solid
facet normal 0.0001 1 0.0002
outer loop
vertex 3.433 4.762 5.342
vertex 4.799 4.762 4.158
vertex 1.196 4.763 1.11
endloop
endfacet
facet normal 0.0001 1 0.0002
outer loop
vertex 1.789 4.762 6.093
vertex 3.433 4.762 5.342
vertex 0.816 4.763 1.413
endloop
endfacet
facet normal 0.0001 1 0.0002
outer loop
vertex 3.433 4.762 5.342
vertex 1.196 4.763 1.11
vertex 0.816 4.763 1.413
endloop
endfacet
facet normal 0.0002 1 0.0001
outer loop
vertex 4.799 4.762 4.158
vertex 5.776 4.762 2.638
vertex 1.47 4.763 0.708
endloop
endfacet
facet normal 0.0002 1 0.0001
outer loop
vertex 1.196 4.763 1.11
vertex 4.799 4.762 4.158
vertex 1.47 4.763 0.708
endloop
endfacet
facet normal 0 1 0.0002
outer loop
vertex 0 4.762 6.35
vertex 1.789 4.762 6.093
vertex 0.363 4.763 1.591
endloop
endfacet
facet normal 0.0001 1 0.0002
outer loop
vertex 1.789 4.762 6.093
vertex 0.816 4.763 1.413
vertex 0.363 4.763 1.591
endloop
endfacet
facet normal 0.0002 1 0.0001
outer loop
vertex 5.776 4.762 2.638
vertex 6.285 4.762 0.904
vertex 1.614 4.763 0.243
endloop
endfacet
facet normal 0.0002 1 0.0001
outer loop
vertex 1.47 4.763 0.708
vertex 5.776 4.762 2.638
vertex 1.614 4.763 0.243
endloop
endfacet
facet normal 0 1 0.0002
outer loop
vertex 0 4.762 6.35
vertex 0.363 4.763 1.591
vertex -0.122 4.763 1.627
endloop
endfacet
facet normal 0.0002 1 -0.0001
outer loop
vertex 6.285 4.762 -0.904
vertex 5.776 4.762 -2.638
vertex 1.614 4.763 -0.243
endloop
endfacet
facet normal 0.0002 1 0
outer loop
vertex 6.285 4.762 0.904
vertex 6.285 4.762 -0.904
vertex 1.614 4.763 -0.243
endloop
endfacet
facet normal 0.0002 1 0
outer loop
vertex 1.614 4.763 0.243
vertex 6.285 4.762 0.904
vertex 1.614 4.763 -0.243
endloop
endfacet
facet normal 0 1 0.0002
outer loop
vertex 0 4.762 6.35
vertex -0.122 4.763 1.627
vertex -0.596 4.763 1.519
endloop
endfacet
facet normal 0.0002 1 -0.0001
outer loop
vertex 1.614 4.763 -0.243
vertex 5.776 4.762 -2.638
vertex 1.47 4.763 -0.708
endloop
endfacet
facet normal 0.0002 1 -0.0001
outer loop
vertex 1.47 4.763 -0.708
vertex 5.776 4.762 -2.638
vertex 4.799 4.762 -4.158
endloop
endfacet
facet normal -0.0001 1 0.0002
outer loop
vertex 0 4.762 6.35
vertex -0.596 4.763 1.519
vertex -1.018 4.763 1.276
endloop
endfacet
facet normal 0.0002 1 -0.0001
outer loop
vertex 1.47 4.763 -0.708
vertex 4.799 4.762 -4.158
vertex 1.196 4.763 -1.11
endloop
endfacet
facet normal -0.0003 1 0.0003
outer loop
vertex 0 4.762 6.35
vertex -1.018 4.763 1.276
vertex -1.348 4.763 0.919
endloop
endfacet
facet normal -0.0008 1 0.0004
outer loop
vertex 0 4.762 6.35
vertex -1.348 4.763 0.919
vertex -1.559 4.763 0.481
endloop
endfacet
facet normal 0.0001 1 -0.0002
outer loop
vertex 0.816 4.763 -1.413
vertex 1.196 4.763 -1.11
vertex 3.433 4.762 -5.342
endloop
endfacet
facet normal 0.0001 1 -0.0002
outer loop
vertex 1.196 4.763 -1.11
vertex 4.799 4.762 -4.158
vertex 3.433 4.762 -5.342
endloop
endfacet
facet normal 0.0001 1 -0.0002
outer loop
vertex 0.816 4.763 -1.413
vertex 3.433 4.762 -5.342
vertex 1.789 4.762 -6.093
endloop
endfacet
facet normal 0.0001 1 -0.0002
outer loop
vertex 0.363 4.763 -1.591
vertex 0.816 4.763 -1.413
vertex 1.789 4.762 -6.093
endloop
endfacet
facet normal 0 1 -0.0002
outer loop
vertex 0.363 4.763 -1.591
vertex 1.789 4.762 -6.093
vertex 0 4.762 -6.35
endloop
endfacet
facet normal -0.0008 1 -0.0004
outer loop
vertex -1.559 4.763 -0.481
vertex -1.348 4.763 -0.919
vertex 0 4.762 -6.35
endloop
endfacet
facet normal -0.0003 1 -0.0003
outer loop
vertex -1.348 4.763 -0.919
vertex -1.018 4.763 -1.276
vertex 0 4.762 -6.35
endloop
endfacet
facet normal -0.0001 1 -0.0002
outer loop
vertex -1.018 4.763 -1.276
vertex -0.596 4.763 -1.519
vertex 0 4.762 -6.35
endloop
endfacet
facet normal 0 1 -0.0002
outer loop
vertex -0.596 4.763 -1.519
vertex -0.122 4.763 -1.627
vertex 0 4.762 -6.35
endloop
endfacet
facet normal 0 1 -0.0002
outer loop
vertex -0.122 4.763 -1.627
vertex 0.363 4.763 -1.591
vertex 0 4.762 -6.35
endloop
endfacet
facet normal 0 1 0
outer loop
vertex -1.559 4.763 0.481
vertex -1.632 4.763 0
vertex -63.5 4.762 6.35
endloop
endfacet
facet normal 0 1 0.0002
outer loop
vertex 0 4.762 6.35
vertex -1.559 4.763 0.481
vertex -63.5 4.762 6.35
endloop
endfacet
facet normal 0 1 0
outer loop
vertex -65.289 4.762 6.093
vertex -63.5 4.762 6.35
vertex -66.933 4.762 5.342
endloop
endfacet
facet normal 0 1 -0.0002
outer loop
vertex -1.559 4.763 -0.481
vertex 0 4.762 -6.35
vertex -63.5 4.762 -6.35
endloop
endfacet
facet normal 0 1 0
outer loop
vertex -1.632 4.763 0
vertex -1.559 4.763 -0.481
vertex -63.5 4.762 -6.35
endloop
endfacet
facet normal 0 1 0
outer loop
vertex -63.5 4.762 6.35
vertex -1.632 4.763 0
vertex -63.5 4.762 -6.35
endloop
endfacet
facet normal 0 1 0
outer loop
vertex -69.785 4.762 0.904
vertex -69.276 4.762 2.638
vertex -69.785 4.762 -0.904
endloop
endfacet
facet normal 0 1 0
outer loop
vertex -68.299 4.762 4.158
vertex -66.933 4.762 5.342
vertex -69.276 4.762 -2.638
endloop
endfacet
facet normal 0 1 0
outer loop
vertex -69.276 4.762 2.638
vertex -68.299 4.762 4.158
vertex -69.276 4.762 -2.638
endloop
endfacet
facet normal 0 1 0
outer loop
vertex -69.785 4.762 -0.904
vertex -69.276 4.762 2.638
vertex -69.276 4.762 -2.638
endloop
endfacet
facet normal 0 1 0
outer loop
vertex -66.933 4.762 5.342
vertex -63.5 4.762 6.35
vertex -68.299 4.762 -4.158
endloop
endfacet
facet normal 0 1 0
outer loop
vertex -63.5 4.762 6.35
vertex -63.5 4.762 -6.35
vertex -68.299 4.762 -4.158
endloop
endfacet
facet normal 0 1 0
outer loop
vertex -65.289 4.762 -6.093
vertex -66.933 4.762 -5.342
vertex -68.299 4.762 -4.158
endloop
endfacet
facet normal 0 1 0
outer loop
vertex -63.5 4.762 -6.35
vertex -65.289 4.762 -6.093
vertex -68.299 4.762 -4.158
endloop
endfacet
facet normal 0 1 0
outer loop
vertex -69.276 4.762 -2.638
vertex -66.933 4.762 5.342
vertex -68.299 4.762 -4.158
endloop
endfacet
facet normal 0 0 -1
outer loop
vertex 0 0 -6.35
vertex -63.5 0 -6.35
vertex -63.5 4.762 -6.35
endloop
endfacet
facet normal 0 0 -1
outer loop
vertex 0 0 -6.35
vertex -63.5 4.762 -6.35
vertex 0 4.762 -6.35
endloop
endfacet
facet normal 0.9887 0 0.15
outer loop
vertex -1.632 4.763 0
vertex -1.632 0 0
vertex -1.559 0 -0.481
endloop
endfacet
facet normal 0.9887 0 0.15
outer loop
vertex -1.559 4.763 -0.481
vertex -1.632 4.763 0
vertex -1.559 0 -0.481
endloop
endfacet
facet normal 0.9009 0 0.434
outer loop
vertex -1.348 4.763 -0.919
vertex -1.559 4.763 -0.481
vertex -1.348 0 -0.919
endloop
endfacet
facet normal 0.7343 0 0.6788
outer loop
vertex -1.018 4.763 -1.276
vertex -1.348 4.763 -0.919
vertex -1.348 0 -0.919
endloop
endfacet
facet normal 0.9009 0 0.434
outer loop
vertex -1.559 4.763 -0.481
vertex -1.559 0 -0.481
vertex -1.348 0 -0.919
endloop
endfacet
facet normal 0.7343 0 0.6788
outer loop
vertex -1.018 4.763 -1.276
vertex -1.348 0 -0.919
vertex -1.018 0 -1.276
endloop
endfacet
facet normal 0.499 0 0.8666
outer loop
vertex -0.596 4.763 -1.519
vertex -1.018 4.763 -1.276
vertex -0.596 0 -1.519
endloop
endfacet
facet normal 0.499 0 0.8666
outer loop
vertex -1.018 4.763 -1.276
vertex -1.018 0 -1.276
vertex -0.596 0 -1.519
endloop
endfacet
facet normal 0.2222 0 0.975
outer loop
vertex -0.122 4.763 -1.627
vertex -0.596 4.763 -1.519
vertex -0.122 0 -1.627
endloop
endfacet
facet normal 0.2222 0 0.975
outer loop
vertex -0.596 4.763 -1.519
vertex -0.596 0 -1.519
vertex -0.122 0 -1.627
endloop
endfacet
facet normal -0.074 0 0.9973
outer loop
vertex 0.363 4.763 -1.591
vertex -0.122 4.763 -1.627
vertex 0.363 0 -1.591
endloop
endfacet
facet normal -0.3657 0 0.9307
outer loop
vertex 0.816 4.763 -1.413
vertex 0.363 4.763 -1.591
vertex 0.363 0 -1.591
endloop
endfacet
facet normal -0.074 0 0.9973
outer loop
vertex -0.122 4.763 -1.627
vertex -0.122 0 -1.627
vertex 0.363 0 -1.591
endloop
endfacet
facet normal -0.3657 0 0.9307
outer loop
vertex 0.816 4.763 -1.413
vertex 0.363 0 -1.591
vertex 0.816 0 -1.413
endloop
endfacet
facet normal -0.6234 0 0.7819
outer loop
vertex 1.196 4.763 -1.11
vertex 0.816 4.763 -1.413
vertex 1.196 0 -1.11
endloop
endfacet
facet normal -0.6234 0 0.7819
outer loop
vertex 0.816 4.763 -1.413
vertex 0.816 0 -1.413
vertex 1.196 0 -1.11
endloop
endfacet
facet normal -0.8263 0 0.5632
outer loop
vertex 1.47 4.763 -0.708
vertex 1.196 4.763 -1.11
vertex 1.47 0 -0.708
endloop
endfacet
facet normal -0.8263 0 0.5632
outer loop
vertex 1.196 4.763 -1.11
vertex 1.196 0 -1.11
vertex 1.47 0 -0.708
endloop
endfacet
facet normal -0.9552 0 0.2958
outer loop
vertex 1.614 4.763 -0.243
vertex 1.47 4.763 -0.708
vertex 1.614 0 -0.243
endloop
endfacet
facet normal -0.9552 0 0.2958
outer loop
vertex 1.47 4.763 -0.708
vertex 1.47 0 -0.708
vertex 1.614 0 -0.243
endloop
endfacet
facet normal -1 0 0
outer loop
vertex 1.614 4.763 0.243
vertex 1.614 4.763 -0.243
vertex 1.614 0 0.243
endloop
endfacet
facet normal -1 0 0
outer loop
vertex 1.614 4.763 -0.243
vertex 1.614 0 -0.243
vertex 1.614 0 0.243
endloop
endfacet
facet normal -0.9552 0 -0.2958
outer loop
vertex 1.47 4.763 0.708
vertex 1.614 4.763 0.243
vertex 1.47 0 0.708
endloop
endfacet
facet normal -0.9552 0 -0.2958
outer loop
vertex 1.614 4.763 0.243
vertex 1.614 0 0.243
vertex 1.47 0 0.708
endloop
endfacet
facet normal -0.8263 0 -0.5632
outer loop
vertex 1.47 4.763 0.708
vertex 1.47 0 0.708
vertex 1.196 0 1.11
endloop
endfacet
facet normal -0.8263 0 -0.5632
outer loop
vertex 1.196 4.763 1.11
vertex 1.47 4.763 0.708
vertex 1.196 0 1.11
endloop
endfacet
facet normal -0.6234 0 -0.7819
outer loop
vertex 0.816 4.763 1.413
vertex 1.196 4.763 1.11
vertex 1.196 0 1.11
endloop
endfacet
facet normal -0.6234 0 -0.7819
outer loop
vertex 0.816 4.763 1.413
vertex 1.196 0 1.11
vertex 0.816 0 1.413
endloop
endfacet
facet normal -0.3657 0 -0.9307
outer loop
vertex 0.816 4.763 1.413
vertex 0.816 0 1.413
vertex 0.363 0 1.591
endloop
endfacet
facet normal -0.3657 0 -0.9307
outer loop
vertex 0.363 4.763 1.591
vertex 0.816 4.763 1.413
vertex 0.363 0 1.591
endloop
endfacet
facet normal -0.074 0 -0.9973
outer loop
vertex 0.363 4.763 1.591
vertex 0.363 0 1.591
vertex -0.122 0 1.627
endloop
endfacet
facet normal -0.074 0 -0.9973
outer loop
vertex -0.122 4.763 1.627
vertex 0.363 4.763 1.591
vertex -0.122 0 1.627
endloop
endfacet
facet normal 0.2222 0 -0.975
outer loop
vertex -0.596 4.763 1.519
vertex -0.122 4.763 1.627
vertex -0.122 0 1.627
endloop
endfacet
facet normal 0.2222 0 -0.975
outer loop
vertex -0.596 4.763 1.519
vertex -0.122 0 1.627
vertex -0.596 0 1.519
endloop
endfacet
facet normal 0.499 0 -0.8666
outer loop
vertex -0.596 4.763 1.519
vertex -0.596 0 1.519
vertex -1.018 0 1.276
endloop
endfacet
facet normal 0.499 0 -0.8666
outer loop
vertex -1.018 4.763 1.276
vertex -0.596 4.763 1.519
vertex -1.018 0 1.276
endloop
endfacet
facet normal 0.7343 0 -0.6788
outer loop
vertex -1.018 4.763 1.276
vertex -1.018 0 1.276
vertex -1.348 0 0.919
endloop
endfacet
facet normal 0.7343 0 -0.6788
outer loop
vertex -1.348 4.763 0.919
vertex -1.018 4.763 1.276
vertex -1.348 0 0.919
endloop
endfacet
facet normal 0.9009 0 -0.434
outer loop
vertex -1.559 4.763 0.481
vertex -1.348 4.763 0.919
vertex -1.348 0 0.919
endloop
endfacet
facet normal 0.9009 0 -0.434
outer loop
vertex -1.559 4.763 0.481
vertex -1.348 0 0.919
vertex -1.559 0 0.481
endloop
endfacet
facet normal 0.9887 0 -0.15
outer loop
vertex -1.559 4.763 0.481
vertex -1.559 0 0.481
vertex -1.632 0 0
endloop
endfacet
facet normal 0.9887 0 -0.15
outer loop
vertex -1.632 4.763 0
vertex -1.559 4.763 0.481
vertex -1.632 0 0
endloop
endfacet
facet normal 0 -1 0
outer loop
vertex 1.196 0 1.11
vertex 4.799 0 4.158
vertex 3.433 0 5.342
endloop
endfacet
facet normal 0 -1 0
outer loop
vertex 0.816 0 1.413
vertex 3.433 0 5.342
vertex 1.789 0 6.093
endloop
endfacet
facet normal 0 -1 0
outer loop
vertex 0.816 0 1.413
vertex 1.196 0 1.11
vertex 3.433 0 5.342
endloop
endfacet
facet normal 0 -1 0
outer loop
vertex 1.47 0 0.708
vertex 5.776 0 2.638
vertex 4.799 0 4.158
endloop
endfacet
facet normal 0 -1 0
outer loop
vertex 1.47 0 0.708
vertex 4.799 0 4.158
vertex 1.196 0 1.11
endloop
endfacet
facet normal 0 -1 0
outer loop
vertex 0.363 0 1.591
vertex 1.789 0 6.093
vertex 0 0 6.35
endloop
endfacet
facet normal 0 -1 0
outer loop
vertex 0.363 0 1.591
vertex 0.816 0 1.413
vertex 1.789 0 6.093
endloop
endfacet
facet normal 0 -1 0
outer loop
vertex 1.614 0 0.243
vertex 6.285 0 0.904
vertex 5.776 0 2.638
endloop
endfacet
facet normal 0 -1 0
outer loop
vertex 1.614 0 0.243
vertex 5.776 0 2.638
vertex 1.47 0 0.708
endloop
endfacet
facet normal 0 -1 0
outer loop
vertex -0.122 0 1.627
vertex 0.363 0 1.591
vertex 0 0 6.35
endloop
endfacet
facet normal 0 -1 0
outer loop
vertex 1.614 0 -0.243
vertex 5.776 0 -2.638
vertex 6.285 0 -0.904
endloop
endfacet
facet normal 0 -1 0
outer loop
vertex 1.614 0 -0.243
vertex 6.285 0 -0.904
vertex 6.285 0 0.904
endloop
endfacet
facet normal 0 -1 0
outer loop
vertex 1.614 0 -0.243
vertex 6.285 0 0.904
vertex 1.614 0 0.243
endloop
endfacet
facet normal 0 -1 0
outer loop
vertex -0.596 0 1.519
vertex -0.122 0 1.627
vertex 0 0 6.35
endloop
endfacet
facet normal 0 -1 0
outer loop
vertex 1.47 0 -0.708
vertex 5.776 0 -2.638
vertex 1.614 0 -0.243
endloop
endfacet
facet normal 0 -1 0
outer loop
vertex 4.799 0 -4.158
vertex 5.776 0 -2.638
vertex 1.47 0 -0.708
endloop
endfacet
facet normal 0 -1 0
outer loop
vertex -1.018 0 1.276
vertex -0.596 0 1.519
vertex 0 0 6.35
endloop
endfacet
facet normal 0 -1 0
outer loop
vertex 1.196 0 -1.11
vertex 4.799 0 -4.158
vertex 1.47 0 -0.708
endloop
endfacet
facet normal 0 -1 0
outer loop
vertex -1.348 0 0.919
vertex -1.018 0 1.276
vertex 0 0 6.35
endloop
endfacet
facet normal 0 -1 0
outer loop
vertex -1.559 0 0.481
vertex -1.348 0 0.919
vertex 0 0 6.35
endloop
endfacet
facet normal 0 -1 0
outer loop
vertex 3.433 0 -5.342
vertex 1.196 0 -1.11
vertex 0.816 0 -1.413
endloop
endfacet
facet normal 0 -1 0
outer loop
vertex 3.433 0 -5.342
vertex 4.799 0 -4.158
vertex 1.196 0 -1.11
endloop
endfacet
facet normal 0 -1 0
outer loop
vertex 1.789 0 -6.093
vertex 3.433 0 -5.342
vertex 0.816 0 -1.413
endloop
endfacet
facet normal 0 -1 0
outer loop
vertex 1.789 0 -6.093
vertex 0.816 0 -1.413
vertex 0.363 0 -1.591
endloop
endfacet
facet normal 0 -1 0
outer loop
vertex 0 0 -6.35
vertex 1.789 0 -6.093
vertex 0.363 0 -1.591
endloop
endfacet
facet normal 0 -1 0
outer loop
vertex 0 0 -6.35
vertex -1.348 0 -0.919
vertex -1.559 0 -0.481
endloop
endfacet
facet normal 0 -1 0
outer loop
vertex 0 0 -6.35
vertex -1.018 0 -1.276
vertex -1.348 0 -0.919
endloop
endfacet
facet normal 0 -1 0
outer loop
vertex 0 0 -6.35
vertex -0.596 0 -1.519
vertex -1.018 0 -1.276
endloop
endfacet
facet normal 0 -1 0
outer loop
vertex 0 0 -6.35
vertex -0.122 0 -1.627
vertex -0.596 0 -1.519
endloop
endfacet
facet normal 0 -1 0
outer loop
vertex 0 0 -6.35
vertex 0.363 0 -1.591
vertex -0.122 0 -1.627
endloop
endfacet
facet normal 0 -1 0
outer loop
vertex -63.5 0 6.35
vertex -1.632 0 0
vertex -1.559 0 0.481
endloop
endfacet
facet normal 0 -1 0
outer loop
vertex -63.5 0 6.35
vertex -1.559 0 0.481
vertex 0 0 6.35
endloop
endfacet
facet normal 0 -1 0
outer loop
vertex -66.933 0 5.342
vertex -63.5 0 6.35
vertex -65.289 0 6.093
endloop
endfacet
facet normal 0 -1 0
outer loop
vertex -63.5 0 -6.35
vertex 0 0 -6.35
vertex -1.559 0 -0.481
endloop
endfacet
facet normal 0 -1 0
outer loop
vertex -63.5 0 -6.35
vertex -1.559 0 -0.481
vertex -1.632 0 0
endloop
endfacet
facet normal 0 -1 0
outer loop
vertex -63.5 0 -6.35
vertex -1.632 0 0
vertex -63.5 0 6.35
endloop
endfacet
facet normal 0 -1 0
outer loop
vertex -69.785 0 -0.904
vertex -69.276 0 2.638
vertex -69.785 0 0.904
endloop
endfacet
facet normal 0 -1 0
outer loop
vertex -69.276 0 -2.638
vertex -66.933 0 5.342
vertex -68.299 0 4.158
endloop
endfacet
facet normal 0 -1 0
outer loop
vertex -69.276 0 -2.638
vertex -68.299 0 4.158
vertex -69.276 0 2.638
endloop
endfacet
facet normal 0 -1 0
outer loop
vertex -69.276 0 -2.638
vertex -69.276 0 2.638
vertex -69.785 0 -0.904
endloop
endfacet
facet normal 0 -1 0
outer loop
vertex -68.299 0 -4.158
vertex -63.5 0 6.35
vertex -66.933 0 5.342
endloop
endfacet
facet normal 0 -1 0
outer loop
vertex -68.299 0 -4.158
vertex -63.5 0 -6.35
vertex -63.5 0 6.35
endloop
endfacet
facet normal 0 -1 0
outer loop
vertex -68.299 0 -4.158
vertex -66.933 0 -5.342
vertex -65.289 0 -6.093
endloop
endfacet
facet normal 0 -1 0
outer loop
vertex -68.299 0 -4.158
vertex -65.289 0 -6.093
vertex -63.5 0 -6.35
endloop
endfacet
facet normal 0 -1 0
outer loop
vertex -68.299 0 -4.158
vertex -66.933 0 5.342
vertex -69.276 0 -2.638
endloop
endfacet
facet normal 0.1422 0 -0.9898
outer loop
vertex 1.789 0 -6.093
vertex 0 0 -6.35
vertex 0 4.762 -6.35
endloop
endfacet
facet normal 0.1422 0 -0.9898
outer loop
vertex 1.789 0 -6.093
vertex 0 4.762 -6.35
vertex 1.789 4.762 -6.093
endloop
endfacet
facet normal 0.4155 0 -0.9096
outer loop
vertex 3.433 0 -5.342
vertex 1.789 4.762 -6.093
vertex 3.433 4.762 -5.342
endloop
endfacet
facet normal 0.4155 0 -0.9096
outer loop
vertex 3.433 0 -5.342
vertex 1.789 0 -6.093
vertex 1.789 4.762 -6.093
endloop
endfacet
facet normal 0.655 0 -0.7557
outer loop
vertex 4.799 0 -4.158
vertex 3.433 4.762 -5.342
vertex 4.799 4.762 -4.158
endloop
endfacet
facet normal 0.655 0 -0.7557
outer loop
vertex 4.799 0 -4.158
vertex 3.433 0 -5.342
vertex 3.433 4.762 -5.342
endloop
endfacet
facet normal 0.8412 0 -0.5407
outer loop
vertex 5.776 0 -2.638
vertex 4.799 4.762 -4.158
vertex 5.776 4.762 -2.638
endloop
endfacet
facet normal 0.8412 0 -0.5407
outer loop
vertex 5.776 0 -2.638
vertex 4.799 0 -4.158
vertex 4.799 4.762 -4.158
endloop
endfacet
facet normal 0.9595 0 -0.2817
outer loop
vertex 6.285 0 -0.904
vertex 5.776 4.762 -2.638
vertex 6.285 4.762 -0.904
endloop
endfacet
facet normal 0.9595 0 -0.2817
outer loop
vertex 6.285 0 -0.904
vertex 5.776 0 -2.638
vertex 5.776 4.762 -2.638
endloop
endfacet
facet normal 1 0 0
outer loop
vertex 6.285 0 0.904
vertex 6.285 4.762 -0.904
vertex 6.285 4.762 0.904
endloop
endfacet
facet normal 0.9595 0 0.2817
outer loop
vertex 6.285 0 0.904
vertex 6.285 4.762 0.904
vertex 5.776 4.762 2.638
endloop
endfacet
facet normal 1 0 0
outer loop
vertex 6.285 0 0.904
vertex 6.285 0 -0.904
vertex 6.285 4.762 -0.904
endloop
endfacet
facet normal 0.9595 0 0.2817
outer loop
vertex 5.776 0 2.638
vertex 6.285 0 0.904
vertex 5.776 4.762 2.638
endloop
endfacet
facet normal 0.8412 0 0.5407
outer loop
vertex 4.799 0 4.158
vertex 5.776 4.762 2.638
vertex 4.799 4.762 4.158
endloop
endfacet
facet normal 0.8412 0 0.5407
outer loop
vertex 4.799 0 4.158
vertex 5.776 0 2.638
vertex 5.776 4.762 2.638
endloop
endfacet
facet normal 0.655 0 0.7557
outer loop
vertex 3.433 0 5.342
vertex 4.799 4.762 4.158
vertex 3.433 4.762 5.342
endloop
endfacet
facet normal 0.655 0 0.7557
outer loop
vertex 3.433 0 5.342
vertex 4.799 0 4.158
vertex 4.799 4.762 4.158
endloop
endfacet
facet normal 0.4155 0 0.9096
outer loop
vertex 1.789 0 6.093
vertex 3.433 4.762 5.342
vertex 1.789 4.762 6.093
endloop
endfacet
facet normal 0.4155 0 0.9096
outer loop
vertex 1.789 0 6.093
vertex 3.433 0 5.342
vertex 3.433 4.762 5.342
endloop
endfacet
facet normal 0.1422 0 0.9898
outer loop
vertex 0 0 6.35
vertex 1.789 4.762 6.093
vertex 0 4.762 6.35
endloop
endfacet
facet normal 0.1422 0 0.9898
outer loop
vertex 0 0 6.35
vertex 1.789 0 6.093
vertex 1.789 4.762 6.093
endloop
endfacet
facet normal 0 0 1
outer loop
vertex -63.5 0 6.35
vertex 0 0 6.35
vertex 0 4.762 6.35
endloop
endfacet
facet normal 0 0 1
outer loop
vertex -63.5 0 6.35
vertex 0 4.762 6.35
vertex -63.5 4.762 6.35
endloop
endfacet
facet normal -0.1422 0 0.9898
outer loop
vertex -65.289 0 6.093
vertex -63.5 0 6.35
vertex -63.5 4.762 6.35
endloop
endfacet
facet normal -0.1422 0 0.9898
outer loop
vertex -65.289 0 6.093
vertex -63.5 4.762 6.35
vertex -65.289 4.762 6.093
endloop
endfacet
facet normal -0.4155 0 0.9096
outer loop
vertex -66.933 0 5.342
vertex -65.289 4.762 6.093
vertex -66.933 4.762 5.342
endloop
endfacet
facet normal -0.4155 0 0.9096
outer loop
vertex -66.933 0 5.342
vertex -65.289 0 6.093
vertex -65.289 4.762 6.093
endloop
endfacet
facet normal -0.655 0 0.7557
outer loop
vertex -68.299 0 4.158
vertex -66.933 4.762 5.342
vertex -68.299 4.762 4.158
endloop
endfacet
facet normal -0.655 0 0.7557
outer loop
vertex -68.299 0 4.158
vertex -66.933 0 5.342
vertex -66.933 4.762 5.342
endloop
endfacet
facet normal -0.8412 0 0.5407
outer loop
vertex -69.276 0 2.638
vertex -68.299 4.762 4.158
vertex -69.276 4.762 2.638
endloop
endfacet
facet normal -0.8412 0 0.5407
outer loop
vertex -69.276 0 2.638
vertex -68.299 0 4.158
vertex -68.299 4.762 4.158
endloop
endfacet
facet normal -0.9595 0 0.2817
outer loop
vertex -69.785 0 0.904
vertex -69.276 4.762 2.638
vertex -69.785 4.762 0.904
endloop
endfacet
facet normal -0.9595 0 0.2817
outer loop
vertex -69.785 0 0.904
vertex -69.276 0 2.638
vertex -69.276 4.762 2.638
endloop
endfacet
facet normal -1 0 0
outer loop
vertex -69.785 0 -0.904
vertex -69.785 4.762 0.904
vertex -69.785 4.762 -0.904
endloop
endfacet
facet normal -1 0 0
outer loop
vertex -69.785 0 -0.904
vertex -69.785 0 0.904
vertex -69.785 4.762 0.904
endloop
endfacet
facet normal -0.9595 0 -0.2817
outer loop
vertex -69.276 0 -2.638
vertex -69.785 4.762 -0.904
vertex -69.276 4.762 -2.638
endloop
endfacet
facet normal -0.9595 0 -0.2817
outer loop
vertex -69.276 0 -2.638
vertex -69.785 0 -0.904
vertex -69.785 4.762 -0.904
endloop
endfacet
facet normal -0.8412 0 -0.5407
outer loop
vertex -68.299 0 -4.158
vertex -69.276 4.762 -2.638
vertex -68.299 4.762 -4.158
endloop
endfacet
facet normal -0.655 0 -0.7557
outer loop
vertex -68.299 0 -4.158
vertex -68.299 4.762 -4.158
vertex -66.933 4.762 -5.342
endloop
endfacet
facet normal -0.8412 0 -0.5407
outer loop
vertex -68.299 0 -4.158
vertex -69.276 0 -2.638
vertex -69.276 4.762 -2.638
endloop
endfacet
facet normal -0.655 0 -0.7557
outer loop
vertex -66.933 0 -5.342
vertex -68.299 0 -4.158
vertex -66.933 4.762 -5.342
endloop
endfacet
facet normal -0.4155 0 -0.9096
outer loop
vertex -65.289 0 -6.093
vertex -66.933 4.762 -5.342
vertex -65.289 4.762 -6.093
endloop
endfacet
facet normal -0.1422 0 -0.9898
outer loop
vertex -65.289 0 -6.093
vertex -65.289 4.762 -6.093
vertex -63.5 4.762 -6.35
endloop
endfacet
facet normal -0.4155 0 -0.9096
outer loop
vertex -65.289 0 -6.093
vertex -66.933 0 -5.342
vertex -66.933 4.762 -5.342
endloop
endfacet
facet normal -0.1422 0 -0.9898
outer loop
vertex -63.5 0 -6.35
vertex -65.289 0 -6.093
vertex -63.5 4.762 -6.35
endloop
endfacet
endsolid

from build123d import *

# Parameters (mm, degrees)
BOSS_EXTRUDE2_DEPTH   = 4.7625
F_4_CLEARANCE_HOLE1_D = 3.2639


with BuildPart() as part:
    # Sketch1 → Boss-Extrude2 (new body)
    with BuildSketch(Plane(origin=(0, 0, 0), x_dir=(1, 0, 0), z_dir=(0, 1, 0))):
        with BuildLine():
            Line((-63.5, 6.35), (0, 6.35))
            ThreePointArc((0, 6.35), (6.35, 0), (0, -6.35))
            Line((0, -6.35), (-63.5, -6.35))
            ThreePointArc((-63.5, -6.35), (-69.85, 0), (-63.5, 6.35))
        make_face()
    extrude(amount=BOSS_EXTRUDE2_DEPTH)

    # #4 Clearance Hole1 (through all)
    with Locations(Plane(origin=(0, 4.7625, 0), x_dir=(1, 0, 0), z_dir=(0, 1, 0))):
        with Locations((0, 0)):
            Hole(F_4_CLEARANCE_HOLE1_D / 2)


solid = part.part
